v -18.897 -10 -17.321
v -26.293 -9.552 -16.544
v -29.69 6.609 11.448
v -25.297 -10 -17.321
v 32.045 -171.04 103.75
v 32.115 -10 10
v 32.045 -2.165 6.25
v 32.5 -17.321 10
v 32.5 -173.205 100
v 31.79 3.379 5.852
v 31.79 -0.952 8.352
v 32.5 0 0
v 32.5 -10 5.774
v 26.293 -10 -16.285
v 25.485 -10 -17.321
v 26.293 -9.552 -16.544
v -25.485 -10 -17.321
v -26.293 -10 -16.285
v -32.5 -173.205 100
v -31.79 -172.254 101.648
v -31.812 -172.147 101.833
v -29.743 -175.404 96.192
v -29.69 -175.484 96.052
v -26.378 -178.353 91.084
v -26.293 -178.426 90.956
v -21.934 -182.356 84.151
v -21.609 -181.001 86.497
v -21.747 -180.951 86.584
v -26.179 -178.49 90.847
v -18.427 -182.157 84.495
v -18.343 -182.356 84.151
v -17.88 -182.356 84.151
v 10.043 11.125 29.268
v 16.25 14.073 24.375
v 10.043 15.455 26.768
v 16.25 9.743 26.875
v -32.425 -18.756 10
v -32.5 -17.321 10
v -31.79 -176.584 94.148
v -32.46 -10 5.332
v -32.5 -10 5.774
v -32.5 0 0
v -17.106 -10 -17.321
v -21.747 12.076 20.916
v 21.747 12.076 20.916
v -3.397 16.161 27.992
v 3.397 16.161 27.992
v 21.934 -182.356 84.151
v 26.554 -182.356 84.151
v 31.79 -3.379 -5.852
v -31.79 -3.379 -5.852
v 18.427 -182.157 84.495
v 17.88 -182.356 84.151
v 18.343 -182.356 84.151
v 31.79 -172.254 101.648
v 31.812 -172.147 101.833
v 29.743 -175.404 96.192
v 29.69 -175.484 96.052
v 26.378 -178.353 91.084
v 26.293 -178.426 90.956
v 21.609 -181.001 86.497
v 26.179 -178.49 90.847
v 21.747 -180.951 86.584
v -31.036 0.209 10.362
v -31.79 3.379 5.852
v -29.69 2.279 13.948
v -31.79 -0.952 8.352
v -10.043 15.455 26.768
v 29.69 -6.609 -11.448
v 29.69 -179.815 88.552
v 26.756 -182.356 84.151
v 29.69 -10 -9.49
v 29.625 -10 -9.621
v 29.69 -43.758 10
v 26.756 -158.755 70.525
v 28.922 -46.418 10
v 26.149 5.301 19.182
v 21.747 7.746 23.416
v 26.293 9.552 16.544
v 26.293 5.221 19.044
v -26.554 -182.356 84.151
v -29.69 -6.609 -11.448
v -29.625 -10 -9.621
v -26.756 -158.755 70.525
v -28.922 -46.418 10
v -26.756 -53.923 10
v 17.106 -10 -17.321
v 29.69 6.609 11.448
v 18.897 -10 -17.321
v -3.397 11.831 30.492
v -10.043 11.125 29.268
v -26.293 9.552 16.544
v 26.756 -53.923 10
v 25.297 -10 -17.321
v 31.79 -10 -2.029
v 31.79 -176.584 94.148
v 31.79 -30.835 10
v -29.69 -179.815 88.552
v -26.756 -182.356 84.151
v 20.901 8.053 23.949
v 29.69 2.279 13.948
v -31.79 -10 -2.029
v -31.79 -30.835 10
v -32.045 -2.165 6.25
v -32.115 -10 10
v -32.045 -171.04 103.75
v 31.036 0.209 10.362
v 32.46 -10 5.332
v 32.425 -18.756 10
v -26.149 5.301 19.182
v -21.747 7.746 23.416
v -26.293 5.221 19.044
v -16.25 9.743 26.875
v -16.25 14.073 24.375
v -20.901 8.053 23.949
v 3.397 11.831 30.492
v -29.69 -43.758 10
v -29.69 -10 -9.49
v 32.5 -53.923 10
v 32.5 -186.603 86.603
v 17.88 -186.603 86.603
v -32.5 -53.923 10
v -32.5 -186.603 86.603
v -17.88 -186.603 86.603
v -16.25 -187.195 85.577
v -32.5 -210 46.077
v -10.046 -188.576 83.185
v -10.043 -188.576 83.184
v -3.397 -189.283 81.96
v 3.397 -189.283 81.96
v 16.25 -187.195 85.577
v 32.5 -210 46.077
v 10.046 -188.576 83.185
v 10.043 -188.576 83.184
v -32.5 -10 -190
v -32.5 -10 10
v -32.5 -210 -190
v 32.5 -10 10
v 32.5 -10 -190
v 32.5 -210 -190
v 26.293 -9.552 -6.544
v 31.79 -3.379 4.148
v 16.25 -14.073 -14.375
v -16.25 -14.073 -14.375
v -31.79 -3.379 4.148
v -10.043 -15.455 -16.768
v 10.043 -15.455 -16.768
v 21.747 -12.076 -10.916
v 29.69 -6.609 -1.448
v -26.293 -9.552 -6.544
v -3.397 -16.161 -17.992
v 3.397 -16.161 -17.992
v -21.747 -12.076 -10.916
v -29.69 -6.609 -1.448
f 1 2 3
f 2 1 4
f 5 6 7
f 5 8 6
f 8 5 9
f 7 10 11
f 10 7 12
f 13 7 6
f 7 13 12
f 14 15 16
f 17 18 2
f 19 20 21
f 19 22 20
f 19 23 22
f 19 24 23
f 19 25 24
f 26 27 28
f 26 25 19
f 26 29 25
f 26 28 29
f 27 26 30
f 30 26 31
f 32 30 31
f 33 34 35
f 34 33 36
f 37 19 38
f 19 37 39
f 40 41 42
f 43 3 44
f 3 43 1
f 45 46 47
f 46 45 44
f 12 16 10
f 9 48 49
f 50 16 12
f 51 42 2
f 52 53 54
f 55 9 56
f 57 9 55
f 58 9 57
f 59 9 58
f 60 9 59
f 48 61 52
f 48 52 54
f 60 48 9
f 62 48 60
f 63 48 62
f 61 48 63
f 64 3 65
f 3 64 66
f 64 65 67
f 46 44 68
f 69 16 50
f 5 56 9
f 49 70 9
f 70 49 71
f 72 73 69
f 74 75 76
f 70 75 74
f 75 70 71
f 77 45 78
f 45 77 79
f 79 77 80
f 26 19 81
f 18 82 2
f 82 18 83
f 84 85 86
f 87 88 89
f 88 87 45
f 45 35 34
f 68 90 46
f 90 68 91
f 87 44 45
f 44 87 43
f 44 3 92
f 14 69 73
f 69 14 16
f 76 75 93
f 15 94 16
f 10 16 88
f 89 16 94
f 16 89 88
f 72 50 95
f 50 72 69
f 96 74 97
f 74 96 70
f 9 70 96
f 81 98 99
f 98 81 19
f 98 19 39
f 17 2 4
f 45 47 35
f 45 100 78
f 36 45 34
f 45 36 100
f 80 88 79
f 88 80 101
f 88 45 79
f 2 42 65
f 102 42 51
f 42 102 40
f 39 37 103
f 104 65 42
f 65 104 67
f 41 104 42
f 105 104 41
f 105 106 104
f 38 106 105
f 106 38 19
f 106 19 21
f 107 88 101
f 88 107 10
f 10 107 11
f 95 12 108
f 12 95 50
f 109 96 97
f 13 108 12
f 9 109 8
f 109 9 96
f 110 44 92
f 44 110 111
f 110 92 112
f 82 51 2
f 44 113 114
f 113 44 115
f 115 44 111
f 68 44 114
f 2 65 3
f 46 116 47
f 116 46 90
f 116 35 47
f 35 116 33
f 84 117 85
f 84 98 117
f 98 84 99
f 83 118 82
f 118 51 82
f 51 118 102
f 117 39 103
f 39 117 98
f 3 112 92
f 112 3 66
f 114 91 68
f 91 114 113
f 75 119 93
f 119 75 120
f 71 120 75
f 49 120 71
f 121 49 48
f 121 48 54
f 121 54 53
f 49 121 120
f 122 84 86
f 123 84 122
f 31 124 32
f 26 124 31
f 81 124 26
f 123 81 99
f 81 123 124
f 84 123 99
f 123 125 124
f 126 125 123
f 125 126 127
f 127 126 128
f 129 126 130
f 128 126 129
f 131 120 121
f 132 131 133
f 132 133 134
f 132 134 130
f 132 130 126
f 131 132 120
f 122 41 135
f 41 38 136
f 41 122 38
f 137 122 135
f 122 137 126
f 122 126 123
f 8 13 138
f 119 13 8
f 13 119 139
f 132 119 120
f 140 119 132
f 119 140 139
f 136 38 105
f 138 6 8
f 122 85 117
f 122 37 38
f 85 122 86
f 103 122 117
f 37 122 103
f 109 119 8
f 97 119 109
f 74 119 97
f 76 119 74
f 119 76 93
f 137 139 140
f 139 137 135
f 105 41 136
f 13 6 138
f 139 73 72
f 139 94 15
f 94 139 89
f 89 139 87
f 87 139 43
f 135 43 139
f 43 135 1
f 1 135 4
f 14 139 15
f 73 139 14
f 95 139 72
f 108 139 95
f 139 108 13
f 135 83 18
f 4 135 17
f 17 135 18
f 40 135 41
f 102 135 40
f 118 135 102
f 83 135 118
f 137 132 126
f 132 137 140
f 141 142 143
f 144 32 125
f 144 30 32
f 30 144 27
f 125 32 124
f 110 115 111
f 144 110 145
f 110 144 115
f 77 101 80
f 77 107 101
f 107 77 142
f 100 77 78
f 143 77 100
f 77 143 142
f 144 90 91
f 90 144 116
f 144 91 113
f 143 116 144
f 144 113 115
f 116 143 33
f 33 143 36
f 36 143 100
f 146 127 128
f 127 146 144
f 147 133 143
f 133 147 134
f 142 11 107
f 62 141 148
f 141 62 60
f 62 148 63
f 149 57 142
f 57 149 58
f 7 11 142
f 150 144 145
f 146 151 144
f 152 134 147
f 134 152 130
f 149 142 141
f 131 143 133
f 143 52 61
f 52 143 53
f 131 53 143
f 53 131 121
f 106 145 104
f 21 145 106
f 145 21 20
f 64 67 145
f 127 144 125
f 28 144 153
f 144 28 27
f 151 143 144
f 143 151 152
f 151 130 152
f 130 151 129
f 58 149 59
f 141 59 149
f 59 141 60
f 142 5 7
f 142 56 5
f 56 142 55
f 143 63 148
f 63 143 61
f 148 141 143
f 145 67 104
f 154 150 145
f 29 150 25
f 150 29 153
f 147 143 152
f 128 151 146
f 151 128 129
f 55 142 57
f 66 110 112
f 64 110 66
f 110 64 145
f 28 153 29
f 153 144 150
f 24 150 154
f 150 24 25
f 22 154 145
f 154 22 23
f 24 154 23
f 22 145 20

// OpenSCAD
    


difference(){
difference(){
union(){
union(){
rotate([60,0,0])
cylinder(h=200, d=65, center = false);
 translate([0,-150,-50])
 rotate([60,0,0])
cube( size= [65,200,200], center=true);
}
translate([0,-110,-90])
cube(size= [65,200,200], center = true);
}
translate([0,-310,-90])
cube(size =[66,200,10000], center = true);
}
translate([0,0,10])
rotate([60,0,0])
cylinder(h=200, d=65, center = false);
}
